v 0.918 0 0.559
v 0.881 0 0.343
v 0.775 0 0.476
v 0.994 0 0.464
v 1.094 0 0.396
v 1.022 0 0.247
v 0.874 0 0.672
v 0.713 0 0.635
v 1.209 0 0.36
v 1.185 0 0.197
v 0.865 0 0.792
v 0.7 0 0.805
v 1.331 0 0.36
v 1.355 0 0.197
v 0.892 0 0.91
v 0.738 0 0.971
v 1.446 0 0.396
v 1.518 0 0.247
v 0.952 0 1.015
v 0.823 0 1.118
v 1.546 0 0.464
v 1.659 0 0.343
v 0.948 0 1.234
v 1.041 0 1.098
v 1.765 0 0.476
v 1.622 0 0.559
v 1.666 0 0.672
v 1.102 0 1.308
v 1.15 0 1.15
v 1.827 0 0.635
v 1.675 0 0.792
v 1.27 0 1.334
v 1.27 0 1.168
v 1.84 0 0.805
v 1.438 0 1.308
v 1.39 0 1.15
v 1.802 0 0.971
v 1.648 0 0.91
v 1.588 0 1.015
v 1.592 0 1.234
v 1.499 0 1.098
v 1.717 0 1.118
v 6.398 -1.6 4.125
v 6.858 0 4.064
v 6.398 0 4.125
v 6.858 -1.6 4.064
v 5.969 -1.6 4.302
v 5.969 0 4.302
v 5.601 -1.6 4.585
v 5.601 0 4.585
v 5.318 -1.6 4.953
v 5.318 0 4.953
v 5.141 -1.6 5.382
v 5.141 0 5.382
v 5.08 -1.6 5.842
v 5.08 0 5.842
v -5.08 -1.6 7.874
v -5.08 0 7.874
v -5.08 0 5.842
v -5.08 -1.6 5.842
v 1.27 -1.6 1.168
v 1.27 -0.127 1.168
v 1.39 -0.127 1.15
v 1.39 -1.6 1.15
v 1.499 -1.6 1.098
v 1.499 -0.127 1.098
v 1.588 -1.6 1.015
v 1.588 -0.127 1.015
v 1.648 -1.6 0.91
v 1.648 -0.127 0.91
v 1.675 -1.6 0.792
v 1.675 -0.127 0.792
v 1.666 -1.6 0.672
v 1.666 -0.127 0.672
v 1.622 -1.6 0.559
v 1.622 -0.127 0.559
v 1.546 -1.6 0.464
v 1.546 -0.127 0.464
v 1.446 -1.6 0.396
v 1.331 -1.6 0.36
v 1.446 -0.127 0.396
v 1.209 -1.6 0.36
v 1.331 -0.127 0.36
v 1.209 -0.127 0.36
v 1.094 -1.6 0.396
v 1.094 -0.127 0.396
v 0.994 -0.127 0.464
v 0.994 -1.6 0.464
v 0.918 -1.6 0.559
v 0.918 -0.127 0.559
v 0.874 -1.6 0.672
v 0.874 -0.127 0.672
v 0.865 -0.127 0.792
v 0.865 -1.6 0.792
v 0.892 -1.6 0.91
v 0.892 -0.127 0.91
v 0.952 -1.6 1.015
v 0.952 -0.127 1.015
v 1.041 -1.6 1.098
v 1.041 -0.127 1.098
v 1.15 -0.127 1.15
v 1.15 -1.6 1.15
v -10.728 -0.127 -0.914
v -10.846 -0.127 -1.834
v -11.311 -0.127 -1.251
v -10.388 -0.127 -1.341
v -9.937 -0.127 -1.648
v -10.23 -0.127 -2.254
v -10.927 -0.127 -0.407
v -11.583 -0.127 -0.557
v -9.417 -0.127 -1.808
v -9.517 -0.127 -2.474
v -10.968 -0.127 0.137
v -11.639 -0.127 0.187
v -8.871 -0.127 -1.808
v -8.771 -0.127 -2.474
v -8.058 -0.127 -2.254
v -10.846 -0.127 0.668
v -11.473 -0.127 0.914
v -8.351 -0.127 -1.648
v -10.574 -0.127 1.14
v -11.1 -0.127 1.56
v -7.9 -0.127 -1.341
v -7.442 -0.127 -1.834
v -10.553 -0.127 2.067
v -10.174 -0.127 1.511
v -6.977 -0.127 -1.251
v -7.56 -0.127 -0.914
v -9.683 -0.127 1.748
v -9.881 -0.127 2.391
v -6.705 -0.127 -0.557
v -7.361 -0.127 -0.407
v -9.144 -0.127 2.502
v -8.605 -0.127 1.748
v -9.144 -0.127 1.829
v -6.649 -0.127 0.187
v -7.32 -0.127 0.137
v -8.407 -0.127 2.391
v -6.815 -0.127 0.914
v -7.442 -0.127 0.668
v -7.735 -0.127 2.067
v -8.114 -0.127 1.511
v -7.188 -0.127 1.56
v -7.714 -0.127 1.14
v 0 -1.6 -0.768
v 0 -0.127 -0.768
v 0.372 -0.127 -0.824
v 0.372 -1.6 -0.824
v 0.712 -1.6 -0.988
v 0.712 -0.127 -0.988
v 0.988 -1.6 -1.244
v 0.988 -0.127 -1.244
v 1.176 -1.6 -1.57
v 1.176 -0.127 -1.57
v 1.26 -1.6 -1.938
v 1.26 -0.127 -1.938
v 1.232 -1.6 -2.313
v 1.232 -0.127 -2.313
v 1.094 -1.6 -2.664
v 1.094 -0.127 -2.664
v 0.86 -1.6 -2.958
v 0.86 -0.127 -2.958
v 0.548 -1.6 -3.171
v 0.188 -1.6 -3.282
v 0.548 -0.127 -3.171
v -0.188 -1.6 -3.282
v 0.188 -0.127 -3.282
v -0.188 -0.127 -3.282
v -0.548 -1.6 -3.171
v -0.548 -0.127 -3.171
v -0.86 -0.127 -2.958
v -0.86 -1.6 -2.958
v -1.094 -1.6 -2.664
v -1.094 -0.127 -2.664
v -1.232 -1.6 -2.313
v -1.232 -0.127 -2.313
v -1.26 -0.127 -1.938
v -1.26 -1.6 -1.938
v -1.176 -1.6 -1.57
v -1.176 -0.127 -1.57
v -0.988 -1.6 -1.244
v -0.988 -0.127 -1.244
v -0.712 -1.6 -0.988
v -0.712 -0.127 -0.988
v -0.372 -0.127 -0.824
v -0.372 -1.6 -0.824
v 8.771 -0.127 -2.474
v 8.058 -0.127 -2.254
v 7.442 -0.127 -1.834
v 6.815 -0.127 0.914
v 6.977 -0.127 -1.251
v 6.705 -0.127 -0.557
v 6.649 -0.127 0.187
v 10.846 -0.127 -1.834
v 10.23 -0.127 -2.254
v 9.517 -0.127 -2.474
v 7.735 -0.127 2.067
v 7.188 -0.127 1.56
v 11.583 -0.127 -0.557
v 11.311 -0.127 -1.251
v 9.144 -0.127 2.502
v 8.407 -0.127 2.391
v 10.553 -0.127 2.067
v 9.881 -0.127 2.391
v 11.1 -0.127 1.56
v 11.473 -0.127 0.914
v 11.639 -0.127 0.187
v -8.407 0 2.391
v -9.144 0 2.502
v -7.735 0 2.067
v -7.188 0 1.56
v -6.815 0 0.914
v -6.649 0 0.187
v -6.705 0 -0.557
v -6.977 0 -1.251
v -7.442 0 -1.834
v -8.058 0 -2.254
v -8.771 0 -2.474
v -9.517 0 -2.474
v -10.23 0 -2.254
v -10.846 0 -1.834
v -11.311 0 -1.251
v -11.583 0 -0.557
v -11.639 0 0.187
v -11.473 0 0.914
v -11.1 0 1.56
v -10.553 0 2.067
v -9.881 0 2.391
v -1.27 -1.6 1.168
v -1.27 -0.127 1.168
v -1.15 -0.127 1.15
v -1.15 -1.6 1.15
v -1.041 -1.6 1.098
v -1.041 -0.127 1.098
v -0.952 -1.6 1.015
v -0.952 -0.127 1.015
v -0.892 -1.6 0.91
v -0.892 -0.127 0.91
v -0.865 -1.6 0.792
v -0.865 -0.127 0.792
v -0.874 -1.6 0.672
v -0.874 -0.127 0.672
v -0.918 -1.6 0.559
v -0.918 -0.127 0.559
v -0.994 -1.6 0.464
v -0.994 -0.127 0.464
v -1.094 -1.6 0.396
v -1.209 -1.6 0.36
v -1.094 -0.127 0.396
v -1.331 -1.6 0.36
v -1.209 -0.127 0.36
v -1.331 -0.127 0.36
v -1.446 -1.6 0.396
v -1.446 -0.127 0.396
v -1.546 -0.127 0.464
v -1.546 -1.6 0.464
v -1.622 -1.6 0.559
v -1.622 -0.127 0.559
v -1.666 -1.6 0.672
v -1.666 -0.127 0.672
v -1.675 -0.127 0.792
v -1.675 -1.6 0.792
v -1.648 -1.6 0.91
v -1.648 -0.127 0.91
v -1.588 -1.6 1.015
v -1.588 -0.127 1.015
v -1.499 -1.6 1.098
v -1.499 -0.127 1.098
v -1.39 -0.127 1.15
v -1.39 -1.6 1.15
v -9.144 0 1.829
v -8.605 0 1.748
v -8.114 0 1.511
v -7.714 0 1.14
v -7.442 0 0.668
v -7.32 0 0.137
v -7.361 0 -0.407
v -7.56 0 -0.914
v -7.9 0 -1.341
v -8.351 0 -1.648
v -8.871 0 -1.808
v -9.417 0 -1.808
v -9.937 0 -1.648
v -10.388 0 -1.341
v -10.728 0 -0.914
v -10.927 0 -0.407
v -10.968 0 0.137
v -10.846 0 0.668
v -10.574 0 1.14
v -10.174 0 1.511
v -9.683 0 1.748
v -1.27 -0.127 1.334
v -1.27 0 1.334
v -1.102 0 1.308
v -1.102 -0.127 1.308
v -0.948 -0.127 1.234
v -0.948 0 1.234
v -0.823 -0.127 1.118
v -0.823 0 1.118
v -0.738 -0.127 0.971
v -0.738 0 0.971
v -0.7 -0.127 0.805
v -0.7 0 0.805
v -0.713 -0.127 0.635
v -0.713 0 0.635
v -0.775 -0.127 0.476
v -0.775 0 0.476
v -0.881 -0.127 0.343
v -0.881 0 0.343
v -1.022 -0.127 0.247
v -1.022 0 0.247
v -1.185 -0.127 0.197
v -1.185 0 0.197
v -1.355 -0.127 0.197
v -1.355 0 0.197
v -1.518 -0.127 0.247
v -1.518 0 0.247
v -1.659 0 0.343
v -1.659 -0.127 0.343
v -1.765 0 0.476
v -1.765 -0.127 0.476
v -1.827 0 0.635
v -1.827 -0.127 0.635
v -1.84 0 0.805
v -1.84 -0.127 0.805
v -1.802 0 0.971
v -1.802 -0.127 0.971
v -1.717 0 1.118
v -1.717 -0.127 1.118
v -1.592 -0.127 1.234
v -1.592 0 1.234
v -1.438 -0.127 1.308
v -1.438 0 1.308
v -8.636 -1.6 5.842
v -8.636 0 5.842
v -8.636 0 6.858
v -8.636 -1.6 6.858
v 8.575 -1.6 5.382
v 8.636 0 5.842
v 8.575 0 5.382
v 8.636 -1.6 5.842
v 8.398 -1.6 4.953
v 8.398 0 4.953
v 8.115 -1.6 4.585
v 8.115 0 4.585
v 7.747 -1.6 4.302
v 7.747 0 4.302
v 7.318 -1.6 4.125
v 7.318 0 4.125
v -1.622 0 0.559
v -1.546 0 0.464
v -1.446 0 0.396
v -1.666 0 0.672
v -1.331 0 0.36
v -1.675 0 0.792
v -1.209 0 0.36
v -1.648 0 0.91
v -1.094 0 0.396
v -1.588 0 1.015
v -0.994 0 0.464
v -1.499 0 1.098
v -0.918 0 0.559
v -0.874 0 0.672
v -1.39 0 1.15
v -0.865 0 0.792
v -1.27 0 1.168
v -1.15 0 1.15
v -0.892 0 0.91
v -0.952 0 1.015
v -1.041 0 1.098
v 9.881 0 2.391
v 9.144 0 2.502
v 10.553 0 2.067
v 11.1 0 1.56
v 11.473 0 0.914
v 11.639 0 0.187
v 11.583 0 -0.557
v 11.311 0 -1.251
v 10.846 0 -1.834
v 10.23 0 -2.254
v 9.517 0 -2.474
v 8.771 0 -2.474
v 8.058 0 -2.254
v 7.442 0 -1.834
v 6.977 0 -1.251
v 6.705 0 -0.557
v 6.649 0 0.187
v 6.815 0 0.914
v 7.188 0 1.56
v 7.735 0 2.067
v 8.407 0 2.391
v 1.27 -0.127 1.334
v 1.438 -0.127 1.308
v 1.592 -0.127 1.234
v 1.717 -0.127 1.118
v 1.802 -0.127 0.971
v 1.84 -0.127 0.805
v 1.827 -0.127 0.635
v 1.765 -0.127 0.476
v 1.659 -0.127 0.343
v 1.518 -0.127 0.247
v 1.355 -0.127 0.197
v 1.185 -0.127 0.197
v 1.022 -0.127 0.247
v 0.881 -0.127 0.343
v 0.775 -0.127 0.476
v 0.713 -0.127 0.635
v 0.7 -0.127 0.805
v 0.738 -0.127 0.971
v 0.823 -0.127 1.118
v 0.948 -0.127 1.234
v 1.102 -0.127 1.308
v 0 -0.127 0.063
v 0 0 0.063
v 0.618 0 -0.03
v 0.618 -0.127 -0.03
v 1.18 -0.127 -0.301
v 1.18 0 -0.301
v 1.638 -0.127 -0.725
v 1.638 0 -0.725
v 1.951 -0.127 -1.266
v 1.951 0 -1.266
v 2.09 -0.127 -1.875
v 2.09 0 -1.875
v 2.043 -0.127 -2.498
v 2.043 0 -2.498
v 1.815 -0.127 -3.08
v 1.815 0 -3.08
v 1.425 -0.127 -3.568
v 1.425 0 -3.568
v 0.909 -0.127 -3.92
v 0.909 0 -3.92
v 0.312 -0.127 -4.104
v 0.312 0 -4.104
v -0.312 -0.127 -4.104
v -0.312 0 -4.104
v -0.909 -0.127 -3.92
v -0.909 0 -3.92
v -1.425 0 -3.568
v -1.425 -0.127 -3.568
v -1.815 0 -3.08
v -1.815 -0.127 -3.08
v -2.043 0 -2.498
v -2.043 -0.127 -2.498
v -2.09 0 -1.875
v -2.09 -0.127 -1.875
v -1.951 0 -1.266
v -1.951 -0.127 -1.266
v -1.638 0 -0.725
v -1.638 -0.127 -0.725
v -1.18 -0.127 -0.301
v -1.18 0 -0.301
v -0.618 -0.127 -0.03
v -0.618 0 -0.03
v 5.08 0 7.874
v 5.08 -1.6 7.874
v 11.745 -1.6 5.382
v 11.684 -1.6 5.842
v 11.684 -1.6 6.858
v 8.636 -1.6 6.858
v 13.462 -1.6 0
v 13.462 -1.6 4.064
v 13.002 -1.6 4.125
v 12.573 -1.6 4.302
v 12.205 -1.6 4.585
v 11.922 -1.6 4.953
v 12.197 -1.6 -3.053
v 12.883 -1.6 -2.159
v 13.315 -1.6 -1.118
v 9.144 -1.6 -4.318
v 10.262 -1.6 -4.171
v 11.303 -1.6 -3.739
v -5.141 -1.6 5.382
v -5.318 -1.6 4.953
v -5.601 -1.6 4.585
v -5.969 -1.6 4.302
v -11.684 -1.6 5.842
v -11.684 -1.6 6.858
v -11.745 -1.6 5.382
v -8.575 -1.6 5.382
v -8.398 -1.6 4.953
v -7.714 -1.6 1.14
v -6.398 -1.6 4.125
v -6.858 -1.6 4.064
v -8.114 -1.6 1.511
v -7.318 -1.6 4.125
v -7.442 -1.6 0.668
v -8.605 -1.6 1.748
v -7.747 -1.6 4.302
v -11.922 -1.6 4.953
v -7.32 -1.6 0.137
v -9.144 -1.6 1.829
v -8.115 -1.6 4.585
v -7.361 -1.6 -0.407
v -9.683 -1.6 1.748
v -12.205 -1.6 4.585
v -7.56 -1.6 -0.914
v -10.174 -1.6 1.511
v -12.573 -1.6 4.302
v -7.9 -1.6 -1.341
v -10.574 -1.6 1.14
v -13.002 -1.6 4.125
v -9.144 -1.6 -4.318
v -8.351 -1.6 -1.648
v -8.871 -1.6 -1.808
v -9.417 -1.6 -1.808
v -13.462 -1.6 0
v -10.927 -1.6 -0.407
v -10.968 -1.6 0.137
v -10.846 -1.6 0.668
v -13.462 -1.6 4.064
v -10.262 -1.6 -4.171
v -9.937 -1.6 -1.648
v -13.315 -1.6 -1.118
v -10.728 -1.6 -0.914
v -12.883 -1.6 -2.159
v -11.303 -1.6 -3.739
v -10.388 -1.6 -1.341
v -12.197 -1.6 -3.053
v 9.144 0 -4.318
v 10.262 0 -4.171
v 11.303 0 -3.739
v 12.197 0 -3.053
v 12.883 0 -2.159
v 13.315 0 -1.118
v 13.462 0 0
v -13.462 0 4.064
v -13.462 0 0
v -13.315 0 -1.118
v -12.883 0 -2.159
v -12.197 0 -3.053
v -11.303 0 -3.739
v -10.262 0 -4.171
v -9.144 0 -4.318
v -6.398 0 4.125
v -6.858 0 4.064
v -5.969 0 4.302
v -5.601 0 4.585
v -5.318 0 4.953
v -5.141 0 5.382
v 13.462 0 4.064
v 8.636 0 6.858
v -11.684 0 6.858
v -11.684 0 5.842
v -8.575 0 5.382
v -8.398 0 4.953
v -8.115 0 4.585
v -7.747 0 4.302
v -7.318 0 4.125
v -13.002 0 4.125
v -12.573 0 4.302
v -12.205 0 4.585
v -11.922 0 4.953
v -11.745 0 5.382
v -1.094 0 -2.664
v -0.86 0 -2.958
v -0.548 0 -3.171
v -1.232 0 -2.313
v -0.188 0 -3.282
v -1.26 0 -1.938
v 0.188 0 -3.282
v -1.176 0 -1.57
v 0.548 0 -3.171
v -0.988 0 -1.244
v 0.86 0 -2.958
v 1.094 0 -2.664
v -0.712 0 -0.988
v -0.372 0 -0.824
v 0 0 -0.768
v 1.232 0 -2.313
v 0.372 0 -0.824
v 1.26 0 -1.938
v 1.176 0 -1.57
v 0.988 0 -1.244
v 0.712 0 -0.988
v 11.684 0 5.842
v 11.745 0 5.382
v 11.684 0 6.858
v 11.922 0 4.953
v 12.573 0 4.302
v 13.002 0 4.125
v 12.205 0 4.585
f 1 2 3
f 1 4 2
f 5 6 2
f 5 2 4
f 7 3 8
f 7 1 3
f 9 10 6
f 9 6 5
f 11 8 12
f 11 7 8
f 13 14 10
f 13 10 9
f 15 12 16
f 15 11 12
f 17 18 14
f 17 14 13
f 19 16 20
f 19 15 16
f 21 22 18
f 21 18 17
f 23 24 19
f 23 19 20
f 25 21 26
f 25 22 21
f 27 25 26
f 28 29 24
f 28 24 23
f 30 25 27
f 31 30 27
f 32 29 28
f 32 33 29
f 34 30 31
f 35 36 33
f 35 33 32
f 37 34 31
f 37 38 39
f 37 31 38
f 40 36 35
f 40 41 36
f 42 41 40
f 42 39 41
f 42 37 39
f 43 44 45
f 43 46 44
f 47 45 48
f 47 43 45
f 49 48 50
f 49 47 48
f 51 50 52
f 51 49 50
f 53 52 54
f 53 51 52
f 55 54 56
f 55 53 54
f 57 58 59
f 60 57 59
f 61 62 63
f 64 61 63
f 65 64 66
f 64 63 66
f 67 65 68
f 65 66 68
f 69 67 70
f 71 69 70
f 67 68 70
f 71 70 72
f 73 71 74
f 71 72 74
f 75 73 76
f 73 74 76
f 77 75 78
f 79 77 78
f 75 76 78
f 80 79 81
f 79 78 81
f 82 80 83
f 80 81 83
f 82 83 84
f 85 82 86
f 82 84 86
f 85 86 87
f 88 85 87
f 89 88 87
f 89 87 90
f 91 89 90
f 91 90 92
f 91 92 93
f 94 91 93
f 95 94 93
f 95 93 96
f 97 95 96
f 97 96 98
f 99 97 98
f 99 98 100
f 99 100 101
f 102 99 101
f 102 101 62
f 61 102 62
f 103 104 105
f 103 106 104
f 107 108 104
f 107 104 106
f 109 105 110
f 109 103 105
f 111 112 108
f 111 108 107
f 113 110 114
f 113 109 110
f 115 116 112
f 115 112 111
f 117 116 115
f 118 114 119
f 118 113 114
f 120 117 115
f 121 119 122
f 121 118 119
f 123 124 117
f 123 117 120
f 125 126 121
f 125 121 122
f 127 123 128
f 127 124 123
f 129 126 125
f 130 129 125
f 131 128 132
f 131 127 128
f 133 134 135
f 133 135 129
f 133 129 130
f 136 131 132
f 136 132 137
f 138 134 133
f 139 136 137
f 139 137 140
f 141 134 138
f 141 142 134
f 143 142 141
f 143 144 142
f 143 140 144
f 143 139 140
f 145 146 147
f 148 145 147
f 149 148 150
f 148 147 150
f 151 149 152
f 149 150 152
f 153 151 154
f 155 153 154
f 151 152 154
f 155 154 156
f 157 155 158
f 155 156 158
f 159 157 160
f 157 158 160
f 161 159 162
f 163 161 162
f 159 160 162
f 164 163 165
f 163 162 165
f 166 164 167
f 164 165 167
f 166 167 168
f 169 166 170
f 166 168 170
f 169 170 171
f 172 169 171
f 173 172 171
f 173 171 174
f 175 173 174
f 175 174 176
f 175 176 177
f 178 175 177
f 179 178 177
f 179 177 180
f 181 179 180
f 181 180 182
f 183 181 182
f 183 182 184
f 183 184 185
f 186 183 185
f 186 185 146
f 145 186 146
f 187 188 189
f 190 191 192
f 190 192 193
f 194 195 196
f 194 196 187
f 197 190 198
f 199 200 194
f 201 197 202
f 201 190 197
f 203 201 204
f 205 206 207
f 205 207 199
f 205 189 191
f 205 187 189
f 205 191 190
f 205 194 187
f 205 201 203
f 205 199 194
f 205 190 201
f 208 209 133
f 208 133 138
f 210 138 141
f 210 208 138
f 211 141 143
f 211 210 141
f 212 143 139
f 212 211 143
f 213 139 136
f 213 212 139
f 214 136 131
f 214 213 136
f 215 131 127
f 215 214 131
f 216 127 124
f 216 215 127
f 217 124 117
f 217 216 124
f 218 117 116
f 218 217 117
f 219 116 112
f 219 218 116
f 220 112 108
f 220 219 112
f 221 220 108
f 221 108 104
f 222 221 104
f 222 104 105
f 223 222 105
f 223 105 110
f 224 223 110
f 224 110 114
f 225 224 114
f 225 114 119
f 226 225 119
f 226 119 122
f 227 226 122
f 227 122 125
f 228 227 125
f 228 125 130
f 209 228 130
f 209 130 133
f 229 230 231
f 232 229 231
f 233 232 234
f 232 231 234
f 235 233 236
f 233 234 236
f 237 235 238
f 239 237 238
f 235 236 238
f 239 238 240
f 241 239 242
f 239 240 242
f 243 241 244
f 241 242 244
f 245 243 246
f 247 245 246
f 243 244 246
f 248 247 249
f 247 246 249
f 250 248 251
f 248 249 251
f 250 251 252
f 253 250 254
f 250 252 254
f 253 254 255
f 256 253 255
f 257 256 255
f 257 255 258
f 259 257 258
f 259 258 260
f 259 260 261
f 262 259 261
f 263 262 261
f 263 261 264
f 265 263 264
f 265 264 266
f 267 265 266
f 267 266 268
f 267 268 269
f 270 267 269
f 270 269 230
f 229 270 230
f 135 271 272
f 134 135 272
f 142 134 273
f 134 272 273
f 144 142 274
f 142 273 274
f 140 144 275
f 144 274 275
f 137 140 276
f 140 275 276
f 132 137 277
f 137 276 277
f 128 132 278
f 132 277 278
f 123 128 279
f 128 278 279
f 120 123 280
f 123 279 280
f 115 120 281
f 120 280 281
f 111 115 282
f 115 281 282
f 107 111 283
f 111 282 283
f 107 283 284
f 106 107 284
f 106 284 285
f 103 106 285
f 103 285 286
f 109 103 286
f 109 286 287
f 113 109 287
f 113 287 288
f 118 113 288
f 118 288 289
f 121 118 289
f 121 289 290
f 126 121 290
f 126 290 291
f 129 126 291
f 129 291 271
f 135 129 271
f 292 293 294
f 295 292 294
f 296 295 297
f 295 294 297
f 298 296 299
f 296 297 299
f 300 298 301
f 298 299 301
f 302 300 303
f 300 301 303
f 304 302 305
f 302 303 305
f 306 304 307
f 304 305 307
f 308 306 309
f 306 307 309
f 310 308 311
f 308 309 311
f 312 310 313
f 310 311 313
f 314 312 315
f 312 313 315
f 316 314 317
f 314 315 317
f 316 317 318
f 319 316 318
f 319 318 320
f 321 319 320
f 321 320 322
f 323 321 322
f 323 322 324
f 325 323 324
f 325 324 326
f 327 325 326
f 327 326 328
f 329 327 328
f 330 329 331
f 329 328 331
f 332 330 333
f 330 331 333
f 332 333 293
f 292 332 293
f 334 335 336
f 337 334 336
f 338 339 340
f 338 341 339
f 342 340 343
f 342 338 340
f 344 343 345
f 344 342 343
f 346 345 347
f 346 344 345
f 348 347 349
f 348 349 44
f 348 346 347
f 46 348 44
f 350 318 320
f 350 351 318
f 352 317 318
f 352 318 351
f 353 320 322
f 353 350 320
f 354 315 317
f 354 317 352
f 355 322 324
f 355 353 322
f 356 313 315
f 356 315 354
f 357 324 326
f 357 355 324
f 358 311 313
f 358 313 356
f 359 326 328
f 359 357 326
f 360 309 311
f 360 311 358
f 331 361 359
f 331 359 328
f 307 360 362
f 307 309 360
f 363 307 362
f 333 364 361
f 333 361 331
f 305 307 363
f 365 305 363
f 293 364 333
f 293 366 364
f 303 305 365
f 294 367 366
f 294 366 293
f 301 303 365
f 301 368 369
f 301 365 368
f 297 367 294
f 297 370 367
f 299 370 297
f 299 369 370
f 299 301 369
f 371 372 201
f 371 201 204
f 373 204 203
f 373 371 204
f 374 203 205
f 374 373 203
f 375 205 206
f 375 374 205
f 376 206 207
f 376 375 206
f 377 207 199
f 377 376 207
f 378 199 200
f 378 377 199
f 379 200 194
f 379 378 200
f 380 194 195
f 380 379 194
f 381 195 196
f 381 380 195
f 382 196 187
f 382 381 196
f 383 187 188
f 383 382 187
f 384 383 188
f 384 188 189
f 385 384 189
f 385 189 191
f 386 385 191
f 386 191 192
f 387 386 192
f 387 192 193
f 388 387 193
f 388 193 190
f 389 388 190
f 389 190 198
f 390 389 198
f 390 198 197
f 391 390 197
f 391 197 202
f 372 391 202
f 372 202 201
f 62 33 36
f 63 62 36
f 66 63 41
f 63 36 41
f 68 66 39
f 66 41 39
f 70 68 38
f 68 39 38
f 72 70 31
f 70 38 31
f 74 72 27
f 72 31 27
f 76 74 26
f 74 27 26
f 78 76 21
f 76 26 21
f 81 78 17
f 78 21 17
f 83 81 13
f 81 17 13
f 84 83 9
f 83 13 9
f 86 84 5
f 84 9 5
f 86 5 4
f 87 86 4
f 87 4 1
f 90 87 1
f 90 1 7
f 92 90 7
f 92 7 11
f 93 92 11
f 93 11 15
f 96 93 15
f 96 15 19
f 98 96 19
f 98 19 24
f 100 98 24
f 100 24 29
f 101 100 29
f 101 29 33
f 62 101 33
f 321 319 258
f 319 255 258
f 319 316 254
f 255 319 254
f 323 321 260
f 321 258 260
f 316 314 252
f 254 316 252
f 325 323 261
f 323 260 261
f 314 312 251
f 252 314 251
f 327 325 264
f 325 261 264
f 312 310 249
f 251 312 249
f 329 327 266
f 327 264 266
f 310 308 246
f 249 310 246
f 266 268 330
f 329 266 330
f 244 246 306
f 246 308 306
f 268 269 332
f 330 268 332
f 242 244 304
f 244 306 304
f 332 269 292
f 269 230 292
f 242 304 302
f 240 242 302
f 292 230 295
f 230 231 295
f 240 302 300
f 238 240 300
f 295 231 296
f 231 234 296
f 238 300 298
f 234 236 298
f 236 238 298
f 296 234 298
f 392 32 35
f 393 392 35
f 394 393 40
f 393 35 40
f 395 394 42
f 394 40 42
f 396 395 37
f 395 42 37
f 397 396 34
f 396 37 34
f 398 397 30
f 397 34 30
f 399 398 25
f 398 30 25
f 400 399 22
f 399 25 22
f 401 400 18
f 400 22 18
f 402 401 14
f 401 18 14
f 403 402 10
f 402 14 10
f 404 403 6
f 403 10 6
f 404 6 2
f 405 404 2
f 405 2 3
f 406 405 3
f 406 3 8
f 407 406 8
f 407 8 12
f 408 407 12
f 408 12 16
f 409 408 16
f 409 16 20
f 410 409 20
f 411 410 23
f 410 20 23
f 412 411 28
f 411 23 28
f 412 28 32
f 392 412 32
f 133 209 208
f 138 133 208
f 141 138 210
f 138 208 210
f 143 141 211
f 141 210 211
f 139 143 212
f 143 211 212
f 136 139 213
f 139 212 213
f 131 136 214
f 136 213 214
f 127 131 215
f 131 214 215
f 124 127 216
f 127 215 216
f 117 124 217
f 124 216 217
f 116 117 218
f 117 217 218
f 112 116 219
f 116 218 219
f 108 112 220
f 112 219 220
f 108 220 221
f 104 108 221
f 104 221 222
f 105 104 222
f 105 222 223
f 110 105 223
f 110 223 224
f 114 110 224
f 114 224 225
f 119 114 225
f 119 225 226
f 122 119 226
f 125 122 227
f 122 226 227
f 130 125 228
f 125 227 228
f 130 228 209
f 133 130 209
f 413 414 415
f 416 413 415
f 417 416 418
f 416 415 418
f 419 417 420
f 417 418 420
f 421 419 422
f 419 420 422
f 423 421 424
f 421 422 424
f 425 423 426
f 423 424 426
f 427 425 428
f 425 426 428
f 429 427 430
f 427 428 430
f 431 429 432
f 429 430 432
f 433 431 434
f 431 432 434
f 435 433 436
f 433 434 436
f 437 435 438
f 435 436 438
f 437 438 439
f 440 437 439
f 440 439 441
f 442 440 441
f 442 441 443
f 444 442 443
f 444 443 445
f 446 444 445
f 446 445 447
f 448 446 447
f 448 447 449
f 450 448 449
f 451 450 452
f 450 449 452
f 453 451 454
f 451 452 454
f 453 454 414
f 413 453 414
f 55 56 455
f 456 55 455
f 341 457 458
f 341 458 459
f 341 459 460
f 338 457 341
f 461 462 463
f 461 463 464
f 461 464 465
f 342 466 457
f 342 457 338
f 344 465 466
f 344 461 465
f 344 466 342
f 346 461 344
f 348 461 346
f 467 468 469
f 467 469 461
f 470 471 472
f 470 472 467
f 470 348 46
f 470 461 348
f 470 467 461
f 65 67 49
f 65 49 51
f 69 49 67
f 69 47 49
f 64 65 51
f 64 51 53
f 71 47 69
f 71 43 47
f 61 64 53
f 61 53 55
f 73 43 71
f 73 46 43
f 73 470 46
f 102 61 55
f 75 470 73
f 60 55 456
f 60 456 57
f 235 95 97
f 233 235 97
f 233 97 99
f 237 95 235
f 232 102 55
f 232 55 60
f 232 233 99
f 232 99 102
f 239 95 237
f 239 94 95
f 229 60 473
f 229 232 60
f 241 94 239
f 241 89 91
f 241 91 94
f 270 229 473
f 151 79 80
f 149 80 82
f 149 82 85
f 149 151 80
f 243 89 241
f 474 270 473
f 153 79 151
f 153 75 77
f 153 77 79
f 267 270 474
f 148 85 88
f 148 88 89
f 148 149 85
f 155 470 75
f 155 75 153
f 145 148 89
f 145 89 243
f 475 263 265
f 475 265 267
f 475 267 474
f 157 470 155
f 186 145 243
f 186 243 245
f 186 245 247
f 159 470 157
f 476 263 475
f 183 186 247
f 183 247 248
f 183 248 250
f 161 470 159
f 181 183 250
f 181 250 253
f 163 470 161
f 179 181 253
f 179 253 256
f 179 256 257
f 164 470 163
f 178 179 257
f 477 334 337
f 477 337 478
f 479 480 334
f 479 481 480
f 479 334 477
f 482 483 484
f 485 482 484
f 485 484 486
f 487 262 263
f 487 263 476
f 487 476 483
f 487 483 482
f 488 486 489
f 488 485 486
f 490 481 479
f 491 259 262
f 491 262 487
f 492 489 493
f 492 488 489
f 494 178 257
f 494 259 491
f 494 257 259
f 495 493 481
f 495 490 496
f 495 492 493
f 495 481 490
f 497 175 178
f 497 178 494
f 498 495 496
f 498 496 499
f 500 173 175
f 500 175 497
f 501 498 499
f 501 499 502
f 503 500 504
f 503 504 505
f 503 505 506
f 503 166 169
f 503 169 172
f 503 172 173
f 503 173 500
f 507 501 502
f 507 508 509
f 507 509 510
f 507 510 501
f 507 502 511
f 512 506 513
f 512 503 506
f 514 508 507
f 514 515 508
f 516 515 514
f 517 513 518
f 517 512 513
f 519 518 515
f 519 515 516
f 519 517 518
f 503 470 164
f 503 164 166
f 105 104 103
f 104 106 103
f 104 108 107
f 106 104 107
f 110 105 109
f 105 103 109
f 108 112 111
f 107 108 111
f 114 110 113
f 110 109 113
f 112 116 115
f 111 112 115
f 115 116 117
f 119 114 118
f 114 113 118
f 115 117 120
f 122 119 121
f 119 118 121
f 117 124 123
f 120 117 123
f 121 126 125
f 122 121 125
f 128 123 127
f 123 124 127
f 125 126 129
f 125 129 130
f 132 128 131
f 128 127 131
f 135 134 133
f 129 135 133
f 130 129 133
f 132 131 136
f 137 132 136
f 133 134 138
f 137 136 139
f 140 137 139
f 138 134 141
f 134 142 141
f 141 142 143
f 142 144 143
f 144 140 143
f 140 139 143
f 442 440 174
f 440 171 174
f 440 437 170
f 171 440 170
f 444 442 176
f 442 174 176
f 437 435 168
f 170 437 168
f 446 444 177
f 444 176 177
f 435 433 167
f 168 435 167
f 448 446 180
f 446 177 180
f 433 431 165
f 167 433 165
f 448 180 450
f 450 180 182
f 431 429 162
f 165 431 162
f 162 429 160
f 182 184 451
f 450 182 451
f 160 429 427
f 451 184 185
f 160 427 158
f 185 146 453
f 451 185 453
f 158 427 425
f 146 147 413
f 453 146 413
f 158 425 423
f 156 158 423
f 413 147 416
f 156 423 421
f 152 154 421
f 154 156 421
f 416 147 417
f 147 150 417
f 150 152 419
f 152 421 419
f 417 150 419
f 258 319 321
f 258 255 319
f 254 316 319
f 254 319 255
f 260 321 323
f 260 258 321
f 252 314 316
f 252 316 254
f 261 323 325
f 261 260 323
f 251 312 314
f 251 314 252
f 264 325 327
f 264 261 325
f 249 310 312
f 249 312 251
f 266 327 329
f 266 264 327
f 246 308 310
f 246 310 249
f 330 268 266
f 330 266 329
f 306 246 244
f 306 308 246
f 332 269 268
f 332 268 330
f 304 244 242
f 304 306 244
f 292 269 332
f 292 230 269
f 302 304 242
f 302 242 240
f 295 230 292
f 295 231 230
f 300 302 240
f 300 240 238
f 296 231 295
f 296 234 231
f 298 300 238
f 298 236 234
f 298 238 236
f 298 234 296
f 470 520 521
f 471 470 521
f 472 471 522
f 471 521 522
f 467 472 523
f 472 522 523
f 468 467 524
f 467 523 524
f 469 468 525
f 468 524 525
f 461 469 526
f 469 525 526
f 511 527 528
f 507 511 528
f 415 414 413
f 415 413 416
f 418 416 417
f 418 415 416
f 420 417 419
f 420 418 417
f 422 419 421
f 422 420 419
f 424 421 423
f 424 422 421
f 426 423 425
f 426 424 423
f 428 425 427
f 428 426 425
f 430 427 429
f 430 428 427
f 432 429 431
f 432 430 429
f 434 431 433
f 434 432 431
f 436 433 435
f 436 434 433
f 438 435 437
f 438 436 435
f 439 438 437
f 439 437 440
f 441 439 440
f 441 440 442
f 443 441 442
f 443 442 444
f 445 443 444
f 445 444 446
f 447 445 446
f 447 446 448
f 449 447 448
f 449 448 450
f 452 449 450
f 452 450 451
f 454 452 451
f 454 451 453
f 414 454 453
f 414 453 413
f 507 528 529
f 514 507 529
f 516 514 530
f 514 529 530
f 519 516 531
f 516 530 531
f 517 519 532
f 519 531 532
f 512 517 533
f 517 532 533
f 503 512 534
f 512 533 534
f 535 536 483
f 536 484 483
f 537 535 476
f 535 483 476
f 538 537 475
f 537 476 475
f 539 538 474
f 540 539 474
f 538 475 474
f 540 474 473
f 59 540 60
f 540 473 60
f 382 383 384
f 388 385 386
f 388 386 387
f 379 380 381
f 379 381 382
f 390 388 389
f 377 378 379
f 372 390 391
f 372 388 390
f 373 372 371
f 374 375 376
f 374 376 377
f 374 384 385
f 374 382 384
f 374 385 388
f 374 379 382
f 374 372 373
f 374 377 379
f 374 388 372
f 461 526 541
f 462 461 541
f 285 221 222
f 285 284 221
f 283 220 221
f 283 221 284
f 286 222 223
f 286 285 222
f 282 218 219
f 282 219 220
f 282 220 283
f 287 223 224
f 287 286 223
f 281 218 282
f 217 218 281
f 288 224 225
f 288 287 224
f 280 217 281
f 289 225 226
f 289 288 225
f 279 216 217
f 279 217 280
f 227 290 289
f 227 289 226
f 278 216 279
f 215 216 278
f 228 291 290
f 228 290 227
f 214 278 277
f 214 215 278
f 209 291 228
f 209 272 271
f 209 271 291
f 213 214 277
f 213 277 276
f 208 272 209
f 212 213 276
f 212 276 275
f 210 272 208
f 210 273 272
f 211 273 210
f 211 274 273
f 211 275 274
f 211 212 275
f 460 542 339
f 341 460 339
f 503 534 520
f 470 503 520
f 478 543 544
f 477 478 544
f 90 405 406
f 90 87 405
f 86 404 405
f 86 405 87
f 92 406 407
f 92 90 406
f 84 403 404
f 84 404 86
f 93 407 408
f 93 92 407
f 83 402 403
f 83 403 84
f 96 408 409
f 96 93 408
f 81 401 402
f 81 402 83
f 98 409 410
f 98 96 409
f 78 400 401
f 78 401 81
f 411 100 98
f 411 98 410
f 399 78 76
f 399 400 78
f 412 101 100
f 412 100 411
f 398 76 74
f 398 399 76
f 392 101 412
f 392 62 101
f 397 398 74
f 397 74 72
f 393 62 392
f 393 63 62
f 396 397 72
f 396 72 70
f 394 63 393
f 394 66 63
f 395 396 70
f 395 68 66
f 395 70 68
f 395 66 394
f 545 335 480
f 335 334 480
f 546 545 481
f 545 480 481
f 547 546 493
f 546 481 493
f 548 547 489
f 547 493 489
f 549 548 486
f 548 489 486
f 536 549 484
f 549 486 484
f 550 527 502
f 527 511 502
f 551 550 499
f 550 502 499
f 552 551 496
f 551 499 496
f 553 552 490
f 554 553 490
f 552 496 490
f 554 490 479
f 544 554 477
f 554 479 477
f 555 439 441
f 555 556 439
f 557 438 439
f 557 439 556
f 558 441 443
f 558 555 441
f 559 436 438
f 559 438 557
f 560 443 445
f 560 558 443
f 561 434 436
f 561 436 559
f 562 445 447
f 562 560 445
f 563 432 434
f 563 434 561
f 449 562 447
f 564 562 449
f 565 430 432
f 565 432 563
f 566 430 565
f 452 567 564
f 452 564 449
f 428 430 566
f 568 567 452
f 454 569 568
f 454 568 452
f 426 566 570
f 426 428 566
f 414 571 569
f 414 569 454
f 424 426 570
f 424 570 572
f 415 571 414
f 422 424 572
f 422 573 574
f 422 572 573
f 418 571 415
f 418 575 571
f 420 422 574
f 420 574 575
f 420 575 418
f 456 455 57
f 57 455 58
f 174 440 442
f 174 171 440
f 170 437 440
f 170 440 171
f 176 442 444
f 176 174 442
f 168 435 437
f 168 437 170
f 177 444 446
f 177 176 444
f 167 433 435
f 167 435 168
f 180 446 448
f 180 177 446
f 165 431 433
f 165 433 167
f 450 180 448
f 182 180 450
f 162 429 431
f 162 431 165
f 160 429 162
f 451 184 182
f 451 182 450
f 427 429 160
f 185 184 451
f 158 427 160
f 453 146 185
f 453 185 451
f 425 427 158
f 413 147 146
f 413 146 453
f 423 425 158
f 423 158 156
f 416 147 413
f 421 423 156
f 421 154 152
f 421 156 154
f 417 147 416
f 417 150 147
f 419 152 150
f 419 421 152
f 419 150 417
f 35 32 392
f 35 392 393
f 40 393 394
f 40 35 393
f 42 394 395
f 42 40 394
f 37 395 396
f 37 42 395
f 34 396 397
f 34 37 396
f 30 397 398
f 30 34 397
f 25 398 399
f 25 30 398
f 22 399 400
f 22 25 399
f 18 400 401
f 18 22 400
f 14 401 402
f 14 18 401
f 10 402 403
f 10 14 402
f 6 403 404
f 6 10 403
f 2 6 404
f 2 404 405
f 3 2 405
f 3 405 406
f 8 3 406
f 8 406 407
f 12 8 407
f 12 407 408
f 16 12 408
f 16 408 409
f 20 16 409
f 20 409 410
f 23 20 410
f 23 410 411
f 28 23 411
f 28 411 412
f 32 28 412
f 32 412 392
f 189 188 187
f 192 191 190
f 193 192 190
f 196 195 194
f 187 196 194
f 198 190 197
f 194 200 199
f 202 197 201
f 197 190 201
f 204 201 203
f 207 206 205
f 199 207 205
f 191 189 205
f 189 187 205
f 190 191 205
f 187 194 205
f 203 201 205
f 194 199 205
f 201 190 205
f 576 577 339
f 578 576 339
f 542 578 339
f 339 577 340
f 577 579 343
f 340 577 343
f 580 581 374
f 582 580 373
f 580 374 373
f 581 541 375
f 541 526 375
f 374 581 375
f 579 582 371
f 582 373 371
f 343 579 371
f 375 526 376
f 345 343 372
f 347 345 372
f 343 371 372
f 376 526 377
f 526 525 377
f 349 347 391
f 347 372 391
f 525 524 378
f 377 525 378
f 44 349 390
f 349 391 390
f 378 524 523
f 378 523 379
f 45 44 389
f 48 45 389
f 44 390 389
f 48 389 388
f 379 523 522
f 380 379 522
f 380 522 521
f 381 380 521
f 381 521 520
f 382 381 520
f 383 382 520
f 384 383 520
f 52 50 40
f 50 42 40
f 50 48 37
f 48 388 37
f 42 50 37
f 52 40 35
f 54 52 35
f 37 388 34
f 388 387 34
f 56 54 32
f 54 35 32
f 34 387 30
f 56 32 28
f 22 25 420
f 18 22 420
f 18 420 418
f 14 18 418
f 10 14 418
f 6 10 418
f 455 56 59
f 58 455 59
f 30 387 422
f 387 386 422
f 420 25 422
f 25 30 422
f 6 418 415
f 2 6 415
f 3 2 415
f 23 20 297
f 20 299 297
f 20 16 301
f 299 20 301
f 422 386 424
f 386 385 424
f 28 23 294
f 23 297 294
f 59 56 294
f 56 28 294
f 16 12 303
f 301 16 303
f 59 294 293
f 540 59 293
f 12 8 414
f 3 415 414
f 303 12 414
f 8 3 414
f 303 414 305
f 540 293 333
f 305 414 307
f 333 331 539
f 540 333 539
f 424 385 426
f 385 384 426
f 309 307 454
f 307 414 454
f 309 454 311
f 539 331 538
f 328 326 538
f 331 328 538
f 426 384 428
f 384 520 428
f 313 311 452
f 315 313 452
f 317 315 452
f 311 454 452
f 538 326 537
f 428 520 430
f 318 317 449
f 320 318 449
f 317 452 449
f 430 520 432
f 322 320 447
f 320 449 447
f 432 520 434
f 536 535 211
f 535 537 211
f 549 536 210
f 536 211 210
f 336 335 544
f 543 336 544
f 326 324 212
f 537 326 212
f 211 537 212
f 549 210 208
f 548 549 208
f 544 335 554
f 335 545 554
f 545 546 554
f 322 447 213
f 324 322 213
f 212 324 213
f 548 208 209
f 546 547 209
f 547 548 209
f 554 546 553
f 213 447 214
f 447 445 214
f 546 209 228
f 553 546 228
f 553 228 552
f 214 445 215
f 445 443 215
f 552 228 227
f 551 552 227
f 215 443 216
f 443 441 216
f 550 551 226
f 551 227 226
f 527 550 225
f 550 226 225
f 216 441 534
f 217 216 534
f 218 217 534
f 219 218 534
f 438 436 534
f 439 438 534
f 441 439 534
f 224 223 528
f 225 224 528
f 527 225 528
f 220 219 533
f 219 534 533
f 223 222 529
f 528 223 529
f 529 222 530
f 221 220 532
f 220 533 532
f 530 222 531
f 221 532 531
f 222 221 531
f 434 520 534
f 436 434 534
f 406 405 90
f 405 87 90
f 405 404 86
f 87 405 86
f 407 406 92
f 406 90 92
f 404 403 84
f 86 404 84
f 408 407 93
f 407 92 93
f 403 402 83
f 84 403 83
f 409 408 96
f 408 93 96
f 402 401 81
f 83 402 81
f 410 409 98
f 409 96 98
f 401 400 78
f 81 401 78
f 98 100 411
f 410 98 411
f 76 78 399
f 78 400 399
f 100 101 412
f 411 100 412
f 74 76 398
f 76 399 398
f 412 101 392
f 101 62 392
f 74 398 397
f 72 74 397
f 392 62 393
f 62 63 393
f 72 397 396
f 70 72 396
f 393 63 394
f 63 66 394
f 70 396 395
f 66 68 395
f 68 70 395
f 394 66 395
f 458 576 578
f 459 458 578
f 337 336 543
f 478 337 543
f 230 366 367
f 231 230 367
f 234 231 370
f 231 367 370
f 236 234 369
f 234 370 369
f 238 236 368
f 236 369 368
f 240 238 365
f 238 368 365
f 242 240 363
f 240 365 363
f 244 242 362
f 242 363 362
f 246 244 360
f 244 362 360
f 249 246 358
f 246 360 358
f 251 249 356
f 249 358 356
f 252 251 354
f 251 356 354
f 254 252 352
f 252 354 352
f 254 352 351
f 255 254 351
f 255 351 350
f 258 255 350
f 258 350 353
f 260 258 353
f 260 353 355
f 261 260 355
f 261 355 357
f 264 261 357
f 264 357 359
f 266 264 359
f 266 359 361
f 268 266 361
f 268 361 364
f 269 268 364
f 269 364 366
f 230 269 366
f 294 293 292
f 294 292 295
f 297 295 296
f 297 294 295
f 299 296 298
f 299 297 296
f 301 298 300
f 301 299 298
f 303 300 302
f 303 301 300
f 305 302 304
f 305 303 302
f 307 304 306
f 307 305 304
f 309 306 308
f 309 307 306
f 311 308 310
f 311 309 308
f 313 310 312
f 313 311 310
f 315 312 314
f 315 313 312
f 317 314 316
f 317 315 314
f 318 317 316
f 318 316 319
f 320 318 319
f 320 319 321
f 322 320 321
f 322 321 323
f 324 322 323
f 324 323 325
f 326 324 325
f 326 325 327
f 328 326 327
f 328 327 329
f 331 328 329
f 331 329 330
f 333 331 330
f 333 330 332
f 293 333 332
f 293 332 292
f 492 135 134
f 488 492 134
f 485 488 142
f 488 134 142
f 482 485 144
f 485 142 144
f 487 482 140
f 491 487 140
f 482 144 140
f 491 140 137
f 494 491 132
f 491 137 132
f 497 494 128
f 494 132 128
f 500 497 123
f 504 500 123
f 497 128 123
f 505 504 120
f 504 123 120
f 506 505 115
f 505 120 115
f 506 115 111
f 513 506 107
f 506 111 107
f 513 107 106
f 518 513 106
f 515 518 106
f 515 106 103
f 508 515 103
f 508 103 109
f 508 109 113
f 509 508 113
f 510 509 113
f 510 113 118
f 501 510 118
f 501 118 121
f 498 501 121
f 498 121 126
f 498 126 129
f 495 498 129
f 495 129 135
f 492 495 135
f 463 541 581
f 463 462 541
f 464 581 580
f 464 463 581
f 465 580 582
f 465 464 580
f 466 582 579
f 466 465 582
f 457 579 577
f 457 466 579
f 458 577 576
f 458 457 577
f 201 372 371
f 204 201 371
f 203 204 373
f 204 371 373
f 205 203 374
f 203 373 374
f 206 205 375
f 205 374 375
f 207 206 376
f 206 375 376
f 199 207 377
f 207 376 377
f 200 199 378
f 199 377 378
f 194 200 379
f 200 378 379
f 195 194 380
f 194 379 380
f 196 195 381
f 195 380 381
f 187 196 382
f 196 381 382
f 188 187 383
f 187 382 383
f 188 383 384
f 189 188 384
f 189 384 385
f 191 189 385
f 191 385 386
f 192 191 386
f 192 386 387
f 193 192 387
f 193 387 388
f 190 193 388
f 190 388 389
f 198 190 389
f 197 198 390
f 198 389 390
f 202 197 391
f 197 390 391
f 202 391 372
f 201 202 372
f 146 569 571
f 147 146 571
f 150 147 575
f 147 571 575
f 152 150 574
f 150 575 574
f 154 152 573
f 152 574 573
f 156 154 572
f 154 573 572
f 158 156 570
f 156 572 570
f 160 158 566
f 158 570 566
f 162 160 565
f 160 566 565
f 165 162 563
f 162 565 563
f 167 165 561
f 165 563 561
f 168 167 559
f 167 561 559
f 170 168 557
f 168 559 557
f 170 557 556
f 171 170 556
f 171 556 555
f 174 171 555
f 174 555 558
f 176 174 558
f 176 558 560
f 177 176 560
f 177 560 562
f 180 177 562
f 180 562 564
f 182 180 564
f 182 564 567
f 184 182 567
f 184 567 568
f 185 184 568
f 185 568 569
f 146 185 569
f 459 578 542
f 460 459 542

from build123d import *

# Parameters (mm, degrees)
SKETCH2_R           = 0.4064
SKETCH2_R_2         = 1.26365
SKETCH2_R_3         = 1.8288
BOSS_EXTRUDE1_DEPTH = 1.6002
SKETCH5_R           = 2.5019
SKETCH5_R_2         = 2.0955
SKETCH5_R_3         = 0.5715
CUT_EXTRUDE1_DEPTH  = 0.127
BOSS_EXTRUDE2_REACH = 17.678
SKETCH6_R           = 2.5019
SKETCH6_R_2         = 2.0955
SKETCH6_R_3         = 1.26365
SKETCH6_R_4         = 0.5715
SKETCH6_R_5         = 0.4064
SKETCH6_R_6         = 1.8288
FILLET1_R           = 1.778


with BuildPart() as part:
    # Sketch2 → Boss-Extrude1 (new body)
    with BuildSketch(Plane(origin=(0, 0, 0), x_dir=(1, 0, 0), z_dir=(0, 1, 0))):
        with BuildLine():
            Line((-9.144, 4.318), (9.144, 4.318))
            ThreePointArc((9.144, 4.318), (12.197287081, 3.053287081), (13.462, 0))
            Line((13.462, 0), (13.462, -4.064))
            Line((13.462, -4.064), (11.684, -4.064))
            Line((11.684, -4.064), (11.684, -6.858))
            Line((11.684, -6.858), (8.636, -6.858))
            Line((8.636, -6.858), (8.636, -4.064))
            Line((8.636, -4.064), (5.08, -4.064))
            Line((5.08, -4.064), (5.08, -7.874))
            Line((5.08, -7.874), (-5.08, -7.874))
            Line((-5.08, -7.874), (-5.08, -4.064))
            Line((-5.08, -4.064), (-8.636, -4.064))
            Line((-8.636, -4.064), (-8.636, -6.858))
            Line((-8.636, -6.858), (-11.684, -6.858))
            Line((-11.684, -6.858), (-11.684, -4.064))
            Line((-11.684, -4.064), (-13.462, -4.064))
            Line((-13.462, -4.064), (-13.462, 0))
            ThreePointArc((-13.462, 0), (-12.197287081, 3.053287081), (-9.144, 4.318))
        make_face()
        with Locations(Location((-1.27, -0.762, 0), (0, 0, 270))):
            Circle(SKETCH2_R, mode=Mode.SUBTRACT)
        with Locations(Location((0, 2.032, 0), (0, 0, 270))):
            Circle(SKETCH2_R_2, mode=Mode.SUBTRACT)
        with Locations(Location((1.27, -0.762, 0), (0, 0, 270))):
            Circle(SKETCH2_R, mode=Mode.SUBTRACT)
        with Locations(Location((-9.144, 0, 0), (0, 0, 270))):
            Circle(SKETCH2_R_3, mode=Mode.SUBTRACT)
    extrude(amount=-BOSS_EXTRUDE1_DEPTH)

    # Sketch5 → Cut-Extrude1 (cut)
    with BuildSketch(Plane(origin=(0, 0, 0), x_dir=(1, 0, 0), z_dir=(0, 1, 0))):
        with Locations(Location((-9.144, 0, 0), (0, 0, 270))):
            Circle(SKETCH5_R)
        with Locations(Location((9.144, 0, 0), (0, 0, 270))):
            Circle(SKETCH5_R)
        with Locations(Location((0, 2.032, 0), (0, 0, 270))):
            Circle(SKETCH5_R_2)
        with Locations(Location((-1.27, -0.762, 0), (0, 0, 270))):
            Circle(SKETCH5_R_3)
        with Locations(Location((1.27, -0.762, 0), (0, 0, 270))):
            Circle(SKETCH5_R_3)
    extrude(amount=-CUT_EXTRUDE1_DEPTH, mode=Mode.SUBTRACT)


with BuildPart() as body_2:

    # Sketch6 → Boss-Extrude2 (new, up to next)
    with BuildSketch(Plane(origin=(0, 0, 0), x_dir=(1, 0, 0), z_dir=(0, 1, 0)), mode=Mode.PRIVATE) as boss_extrude2_sk1:
        with Locations(Location((9.144, 0, 0), (0, 0, 270))):
            Circle(SKETCH6_R)
    boss_extrude2_tool1 = extrude(boss_extrude2_sk1.sketch, amount=-BOSS_EXTRUDE2_REACH, mode=Mode.PRIVATE) - part.part
    # Sketch6 → Boss-Extrude2 (new, up to next)
    with BuildSketch(Plane(origin=(0, 0, 0), x_dir=(1, 0, 0), z_dir=(0, 1, 0)), mode=Mode.PRIVATE) as boss_extrude2_sk2:
        with Locations(Location((0, 2.032, 0), (0, 0, 270))):
            Circle(SKETCH6_R_2)
        with Locations(Location((0, 2.032, 0), (0, 0, 270))):
            Circle(SKETCH6_R_3, mode=Mode.SUBTRACT)
    boss_extrude2_tool2 = extrude(boss_extrude2_sk2.sketch, amount=-BOSS_EXTRUDE2_REACH, mode=Mode.PRIVATE) - part.part
    # Sketch6 → Boss-Extrude2 (new, up to next)
    with BuildSketch(Plane(origin=(0, 0, 0), x_dir=(1, 0, 0), z_dir=(0, 1, 0)), mode=Mode.PRIVATE) as boss_extrude2_sk3:
        with Locations(Location((-1.27, -0.762, 0), (0, 0, 270))):
            Circle(SKETCH6_R_4)
        with Locations(Location((-1.27, -0.762, 0), (0, 0, 270))):
            Circle(SKETCH6_R_5, mode=Mode.SUBTRACT)
    boss_extrude2_tool3 = extrude(boss_extrude2_sk3.sketch, amount=-BOSS_EXTRUDE2_REACH, mode=Mode.PRIVATE) - part.part
    # Sketch6 → Boss-Extrude2 (new, up to next)
    with BuildSketch(Plane(origin=(0, 0, 0), x_dir=(1, 0, 0), z_dir=(0, 1, 0)), mode=Mode.PRIVATE) as boss_extrude2_sk4:
        with Locations(Location((1.27, -0.762, 0), (0, 0, 270))):
            Circle(SKETCH6_R_4)
        with Locations(Location((1.27, -0.762, 0), (0, 0, 270))):
            Circle(SKETCH6_R_5, mode=Mode.SUBTRACT)
    boss_extrude2_tool4 = extrude(boss_extrude2_sk4.sketch, amount=-BOSS_EXTRUDE2_REACH, mode=Mode.PRIVATE) - part.part
    # Sketch6 → Boss-Extrude2 (new, up to next)
    with BuildSketch(Plane(origin=(0, 0, 0), x_dir=(1, 0, 0), z_dir=(0, 1, 0)), mode=Mode.PRIVATE) as boss_extrude2_sk5:
        with Locations(Location((-9.144, 0, 0), (0, 0, 270))):
            Circle(SKETCH6_R)
        with Locations(Location((-9.144, 0, 0), (0, 0, 270))):
            Circle(SKETCH6_R_6, mode=Mode.SUBTRACT)
    boss_extrude2_tool5 = extrude(boss_extrude2_sk5.sketch, amount=-BOSS_EXTRUDE2_REACH, mode=Mode.PRIVATE) - part.part
    add(boss_extrude2_tool1.solids().sort_by_distance((9.144, 0, 0))[0])
    add(boss_extrude2_tool2.solids().sort_by_distance((0, 0, -4.06823))[0])
    add(boss_extrude2_tool3.solids().sort_by_distance((-1.27, 0, 0.206664))[0])
    add(boss_extrude2_tool4.solids().sort_by_distance((1.27, 0, 0.206664))[0])
    add(boss_extrude2_tool5.solids().sort_by_distance((-9.144, 0, -2.431136))[0])


with BuildPart() as part_1:
    add(part.part)

    # Fillet1
    fillet1_edges = [part_1.edges().sort_by_distance(p)[0] for p in [
        (5.08, -0.8001, 4.064),
        (8.636, -0.8001, 4.064),
        (-8.636, -0.8001, 4.064),
        (-11.684, -0.8001, 4.064),
        (-5.08, -0.8001, 4.064),
        (11.684, -0.8001, 4.064),
    ]]
    fillet(fillet1_edges, radius=FILLET1_R - 0.0001)  # a hair under: the kernel refuses the full size


solid = Compound([body_2.part, part_1.part])
